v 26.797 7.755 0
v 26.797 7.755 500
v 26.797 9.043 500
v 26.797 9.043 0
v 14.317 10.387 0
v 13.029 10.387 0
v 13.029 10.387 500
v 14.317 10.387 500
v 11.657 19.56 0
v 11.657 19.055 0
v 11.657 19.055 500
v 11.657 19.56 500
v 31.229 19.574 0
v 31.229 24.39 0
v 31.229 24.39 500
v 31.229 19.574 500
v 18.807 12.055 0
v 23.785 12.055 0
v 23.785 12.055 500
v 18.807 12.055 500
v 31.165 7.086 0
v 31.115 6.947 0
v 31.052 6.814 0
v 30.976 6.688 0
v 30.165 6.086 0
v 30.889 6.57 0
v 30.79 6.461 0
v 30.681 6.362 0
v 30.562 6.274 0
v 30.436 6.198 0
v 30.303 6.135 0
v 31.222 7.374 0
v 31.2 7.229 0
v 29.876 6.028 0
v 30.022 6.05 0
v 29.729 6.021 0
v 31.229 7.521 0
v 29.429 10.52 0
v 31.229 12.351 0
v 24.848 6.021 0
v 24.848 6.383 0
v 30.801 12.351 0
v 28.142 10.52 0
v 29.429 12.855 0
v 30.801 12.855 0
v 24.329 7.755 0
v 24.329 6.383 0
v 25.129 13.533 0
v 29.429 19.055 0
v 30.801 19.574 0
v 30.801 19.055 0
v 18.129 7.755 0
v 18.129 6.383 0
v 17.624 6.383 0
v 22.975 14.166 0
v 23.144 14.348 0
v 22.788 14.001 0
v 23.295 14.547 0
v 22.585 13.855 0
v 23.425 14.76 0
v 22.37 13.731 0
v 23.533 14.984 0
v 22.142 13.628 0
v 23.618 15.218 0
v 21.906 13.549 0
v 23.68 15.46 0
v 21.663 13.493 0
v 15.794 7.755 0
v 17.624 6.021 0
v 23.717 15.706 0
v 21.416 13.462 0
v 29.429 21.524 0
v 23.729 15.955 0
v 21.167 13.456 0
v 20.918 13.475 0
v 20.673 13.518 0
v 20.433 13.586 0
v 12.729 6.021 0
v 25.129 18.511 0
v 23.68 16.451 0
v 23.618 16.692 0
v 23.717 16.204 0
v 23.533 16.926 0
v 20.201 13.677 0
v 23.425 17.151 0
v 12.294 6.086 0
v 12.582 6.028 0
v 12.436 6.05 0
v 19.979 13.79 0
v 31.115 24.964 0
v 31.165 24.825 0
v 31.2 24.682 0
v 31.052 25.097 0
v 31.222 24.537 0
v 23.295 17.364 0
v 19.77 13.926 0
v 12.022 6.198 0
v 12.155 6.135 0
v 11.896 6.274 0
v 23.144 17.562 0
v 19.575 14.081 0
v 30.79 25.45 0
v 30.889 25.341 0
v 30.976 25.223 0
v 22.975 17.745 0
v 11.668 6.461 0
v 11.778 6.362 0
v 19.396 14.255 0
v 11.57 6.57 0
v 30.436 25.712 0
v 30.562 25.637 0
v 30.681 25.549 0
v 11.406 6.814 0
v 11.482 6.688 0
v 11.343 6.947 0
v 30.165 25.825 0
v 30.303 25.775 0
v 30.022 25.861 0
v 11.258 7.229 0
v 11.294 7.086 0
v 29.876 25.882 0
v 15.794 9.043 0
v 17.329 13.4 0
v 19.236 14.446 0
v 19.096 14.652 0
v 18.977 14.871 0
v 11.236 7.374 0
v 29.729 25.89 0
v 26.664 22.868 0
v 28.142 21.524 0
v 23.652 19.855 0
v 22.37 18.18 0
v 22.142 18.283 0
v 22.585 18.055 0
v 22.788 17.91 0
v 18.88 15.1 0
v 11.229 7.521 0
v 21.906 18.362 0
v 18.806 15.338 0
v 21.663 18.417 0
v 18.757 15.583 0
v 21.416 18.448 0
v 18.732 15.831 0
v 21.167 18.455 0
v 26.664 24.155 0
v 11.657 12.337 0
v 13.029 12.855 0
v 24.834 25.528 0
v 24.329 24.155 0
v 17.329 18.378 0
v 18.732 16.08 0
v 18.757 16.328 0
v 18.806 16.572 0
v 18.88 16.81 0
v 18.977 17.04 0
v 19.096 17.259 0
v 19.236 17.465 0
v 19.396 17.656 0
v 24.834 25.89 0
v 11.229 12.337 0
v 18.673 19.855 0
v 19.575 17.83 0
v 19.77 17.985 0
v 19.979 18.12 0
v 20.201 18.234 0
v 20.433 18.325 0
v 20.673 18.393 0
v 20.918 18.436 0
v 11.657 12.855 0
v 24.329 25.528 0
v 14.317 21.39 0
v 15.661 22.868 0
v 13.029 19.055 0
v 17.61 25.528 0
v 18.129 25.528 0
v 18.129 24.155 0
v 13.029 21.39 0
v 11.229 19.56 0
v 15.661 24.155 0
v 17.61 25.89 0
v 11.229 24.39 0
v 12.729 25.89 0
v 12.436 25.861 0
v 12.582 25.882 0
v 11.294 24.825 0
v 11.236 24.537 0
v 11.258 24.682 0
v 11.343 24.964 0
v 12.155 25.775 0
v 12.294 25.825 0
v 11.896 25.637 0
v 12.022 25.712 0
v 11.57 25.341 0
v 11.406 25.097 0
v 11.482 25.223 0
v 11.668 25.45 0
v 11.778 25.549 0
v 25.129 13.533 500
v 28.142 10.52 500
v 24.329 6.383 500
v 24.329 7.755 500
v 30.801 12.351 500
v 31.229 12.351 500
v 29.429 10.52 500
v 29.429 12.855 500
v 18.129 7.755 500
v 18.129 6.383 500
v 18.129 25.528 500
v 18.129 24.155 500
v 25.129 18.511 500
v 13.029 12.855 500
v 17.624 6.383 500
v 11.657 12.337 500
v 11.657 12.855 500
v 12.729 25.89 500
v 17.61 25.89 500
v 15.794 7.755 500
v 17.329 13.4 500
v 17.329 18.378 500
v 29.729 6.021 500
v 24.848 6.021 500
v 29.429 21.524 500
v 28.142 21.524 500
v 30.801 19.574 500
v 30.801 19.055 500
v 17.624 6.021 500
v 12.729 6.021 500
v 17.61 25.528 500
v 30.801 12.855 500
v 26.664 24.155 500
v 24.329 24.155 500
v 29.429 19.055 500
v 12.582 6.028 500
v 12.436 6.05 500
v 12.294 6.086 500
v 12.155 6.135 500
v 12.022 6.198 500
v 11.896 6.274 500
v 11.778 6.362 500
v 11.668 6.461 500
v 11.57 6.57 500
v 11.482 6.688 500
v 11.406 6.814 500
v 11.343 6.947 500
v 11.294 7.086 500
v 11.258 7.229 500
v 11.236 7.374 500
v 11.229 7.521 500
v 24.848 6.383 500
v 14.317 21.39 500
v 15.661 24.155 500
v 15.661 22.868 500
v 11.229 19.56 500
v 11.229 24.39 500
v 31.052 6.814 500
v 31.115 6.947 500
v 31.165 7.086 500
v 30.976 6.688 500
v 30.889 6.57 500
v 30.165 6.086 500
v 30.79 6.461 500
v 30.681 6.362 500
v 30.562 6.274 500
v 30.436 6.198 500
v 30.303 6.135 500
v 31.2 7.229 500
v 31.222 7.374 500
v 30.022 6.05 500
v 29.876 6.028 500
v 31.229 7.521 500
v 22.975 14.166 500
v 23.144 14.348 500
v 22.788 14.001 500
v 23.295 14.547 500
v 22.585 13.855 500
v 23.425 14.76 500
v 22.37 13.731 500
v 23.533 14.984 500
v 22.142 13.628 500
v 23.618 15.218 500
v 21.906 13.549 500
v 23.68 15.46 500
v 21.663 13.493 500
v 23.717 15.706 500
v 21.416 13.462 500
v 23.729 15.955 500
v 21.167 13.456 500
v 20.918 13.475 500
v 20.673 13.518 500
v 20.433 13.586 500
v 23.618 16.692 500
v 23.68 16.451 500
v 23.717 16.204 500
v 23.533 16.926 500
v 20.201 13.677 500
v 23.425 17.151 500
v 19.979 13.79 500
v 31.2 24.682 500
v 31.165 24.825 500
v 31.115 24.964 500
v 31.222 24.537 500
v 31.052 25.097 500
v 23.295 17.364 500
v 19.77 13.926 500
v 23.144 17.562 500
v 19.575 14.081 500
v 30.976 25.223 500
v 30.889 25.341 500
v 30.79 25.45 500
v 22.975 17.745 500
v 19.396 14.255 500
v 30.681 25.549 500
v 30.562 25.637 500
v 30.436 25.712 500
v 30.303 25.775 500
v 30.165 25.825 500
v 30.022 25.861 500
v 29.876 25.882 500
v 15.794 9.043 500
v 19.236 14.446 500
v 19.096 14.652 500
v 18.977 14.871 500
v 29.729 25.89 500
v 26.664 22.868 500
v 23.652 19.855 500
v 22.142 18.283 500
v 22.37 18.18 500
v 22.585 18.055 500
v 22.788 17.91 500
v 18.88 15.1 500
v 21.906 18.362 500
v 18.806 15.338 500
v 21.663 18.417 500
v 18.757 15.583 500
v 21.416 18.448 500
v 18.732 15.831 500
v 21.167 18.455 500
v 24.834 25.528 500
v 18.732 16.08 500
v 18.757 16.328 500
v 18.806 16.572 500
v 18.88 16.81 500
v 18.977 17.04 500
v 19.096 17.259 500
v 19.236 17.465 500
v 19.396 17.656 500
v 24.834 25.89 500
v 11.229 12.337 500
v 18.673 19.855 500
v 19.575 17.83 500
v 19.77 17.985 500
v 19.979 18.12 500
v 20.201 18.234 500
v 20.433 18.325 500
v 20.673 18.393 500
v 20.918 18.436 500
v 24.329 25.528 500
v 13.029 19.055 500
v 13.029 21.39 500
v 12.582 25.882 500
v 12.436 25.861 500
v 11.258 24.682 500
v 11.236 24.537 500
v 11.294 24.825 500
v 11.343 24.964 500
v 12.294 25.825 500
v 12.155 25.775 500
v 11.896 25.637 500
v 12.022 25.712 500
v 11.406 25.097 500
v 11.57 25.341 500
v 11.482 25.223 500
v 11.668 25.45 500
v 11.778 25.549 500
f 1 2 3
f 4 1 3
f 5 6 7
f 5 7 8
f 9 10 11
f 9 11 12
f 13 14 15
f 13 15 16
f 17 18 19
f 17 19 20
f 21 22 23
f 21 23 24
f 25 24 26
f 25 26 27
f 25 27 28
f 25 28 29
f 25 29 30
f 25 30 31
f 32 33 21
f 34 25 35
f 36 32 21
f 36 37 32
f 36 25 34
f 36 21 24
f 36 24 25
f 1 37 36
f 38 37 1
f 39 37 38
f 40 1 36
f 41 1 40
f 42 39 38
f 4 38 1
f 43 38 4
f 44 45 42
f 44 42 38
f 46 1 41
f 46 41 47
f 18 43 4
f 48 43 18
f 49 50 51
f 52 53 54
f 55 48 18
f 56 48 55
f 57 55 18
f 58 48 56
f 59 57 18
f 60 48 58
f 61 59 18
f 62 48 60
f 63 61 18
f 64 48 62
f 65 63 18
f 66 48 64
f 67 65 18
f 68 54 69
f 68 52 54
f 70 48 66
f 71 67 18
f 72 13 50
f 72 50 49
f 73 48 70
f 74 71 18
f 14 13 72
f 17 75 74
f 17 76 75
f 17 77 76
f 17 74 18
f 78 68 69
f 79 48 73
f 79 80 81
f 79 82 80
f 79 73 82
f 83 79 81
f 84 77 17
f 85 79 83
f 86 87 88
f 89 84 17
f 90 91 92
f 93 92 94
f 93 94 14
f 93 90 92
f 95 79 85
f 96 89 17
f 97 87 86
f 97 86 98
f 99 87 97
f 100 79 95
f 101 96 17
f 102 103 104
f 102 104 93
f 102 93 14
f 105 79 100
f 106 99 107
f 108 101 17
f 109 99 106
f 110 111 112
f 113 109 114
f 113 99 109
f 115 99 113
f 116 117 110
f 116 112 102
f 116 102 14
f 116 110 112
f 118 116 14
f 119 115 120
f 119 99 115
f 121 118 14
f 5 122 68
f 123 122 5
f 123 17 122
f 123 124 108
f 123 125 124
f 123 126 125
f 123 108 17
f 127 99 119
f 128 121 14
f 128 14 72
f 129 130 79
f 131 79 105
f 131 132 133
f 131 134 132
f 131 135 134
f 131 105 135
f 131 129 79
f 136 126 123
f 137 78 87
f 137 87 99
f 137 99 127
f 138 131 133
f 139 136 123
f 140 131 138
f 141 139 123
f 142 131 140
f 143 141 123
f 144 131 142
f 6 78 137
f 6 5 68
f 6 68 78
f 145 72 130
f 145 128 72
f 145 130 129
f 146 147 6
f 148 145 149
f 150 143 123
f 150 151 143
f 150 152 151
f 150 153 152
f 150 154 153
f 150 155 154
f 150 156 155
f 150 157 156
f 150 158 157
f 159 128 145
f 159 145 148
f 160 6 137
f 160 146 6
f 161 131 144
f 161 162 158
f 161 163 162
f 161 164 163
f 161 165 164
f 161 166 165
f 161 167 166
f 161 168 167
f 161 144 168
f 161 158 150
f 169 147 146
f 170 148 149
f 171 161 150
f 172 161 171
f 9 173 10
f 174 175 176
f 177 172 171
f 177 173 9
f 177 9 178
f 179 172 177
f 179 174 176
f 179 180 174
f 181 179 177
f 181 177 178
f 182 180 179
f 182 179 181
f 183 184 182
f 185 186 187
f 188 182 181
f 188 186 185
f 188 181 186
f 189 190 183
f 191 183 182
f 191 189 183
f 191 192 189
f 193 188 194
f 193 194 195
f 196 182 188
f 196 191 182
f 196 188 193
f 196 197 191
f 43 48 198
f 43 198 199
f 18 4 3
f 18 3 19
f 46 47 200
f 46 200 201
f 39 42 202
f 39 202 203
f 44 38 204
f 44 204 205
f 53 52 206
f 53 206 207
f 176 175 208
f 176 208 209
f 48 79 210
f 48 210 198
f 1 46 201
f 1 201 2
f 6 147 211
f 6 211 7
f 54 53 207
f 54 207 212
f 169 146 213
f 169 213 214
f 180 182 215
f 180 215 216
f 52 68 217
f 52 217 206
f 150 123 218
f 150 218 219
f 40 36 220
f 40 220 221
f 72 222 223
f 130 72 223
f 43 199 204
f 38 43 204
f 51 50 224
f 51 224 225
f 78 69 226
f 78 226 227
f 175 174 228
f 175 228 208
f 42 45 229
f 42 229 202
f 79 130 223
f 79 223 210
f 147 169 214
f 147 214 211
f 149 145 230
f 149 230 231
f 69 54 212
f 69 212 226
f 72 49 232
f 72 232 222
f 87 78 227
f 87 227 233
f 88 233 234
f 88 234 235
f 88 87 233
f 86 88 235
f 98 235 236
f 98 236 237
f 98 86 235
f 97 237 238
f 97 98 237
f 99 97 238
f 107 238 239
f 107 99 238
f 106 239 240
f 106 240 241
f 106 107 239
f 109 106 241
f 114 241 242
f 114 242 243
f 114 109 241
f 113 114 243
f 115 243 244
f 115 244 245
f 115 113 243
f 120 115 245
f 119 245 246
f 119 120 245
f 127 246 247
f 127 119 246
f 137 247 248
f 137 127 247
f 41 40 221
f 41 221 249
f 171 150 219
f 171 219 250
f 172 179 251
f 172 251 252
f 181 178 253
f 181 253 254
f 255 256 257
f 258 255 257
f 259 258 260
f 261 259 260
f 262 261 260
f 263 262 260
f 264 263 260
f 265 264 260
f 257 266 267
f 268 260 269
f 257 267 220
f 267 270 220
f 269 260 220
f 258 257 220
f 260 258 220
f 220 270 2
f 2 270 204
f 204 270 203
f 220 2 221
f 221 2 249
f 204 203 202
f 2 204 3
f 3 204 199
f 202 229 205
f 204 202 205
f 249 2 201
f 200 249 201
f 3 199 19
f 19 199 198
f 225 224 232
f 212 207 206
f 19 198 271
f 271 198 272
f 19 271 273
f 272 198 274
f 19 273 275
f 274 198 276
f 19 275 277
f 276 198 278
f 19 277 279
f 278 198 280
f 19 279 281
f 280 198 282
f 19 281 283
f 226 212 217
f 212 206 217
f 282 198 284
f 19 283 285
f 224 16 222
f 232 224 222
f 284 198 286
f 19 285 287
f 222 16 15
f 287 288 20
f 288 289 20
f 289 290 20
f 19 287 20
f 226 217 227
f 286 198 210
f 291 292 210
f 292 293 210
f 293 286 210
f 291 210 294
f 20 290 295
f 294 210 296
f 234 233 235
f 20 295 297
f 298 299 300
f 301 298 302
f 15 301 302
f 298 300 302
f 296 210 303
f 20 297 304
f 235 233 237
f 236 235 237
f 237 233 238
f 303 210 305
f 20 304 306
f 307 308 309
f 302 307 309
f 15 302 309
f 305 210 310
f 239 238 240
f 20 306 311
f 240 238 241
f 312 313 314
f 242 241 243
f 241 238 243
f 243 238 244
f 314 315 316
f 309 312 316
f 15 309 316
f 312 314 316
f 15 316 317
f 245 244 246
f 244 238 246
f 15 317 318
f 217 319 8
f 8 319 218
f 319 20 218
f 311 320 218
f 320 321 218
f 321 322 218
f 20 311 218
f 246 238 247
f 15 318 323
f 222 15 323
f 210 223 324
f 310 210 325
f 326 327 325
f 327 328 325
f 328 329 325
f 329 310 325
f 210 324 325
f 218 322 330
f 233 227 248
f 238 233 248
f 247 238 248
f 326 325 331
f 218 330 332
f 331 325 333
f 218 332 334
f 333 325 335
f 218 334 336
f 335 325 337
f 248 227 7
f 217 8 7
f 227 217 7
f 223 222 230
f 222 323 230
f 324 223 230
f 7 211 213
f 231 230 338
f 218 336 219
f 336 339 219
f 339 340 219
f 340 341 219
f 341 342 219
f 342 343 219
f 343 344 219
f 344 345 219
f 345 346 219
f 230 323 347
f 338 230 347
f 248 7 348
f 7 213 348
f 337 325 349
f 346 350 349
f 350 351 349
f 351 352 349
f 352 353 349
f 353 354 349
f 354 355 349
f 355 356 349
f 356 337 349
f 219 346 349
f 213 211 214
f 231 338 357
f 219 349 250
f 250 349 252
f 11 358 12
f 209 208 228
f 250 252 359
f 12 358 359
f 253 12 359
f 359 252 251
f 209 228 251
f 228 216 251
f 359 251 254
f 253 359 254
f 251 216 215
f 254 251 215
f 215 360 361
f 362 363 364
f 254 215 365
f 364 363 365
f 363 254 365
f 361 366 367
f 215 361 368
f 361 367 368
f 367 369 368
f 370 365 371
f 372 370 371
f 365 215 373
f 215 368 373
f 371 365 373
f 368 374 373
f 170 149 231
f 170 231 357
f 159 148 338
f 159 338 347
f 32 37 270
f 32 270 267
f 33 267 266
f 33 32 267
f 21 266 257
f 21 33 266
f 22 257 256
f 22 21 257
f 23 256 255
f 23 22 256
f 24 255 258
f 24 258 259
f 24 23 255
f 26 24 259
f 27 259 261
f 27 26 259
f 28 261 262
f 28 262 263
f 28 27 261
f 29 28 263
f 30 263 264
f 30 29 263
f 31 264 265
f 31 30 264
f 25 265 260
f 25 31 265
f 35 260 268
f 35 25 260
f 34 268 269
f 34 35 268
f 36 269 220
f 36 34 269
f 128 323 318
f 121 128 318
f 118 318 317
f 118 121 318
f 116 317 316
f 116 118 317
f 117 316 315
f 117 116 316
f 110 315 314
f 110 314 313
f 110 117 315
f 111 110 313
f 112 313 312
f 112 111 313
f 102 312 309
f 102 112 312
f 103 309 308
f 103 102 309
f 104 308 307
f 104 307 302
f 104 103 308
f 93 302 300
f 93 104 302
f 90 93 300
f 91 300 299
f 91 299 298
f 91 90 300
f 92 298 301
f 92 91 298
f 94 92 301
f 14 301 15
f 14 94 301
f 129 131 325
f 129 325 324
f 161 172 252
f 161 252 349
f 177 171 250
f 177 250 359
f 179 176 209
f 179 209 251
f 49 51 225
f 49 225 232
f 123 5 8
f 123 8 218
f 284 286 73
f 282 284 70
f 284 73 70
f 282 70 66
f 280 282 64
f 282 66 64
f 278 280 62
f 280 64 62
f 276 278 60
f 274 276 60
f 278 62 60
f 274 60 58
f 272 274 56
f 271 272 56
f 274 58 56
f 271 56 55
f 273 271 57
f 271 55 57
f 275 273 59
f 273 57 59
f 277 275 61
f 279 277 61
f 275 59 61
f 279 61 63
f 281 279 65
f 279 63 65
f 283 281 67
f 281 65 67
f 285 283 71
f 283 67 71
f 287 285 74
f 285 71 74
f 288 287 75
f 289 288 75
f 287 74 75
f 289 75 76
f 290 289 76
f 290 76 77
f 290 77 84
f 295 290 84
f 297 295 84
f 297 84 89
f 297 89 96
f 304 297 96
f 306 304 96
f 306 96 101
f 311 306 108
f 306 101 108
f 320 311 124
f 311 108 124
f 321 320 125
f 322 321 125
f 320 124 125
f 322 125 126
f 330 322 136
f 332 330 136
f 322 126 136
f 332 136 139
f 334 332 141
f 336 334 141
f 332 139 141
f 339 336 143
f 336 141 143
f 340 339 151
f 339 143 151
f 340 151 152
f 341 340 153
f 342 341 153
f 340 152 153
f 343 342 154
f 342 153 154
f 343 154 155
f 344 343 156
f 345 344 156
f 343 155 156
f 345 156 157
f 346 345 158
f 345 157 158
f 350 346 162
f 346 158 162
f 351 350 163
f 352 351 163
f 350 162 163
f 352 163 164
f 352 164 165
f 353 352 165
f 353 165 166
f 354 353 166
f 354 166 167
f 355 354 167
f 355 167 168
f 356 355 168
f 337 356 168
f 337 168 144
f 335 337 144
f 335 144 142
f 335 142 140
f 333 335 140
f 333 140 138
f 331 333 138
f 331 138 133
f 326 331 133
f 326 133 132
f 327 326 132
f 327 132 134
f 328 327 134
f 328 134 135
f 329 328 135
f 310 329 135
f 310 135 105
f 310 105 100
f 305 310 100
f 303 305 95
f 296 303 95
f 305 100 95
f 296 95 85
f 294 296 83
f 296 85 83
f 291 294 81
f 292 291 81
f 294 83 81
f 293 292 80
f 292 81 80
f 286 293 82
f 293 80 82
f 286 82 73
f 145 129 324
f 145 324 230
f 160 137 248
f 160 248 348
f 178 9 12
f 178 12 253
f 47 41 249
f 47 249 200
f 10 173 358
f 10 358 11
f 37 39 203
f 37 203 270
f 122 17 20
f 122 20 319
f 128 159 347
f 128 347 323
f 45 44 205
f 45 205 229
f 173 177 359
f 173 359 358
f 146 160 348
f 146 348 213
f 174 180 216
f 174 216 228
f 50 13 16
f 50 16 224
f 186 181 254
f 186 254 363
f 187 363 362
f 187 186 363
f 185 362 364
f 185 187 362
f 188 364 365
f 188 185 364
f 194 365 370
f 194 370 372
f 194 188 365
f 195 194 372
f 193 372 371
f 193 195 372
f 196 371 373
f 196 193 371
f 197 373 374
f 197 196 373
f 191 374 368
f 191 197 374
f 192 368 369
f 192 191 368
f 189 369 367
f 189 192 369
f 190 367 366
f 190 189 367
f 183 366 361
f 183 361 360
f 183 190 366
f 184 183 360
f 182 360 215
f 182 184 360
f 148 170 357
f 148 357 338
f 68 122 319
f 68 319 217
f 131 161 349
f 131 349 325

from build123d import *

# Parameters (mm, degrees)
SKETCH1_R           = 2.5
BOSS_EXTRUDE1_DEPTH = 500


with BuildPart() as part:
    # Sketch1 → Boss-Extrude1 (new body)
    with BuildSketch(Plane(origin=(0, 0, 0), x_dir=(-1, 0, 0), z_dir=(0, 0, -1))):
        with BuildLine():
            Line((-31.229112559, 24.389540696), (-31.229112559, 19.574084592))
            Line((-31.229112559, 19.574084592), (-30.801486653, 19.574084592))
            Line((-30.801486653, 19.574084592), (-30.801486653, 19.055371932))
            Line((-30.801486653, 19.055371932), (-29.429112559, 19.055371932))
            Line((-29.429112559, 19.055371932), (-29.429112559, 21.523527696))
            Line((-29.429112559, 21.523527696), (-28.141605593, 21.523527696))
            Line((-28.141605593, 21.523527696), (-25.129112559, 18.511034662))
            Line((-25.129112559, 18.511034662), (-25.129112559, 13.532983276))
            Line((-25.129112559, 13.532983276), (-28.141605593, 10.520490242))
            Line((-28.141605593, 10.520490242), (-29.429112559, 10.520490242))
            Line((-29.429112559, 10.520490242), (-29.429112559, 12.855371932))
            Line((-29.429112559, 12.855371932), (-30.801486653, 12.855371932))
            Line((-30.801486653, 12.855371932), (-30.801486653, 12.350696072))
            Line((-30.801486653, 12.350696072), (-31.229112559, 12.350696072))
            Line((-31.229112559, 12.350696072), (-31.229112559, 7.521203168))
            ThreePointArc((-31.229112559, 7.521203168), (-30.789772731, 6.460542996), (-29.729112559, 6.021203168))
            Line((-29.729112559, 6.021203168), (-24.847825219, 6.021203168))
            Line((-24.847825219, 6.021203168), (-24.847825219, 6.382997838))
            Line((-24.847825219, 6.382997838), (-24.329112559, 6.382997838))
            Line((-24.329112559, 6.382997838), (-24.329112559, 7.755371932))
            Line((-24.329112559, 7.755371932), (-26.797268323, 7.755371932))
            Line((-26.797268323, 7.755371932), (-26.797268323, 9.042878898))
            Line((-26.797268323, 9.042878898), (-23.784775289, 12.055371932))
            Line((-23.784775289, 12.055371932), (-18.806723903, 12.055371932))
            Line((-18.806723903, 12.055371932), (-15.794230869, 9.042878898))
            Line((-15.794230869, 9.042878898), (-15.794230869, 7.755371932))
            Line((-15.794230869, 7.755371932), (-18.129112559, 7.755371932))
            Line((-18.129112559, 7.755371932), (-18.129112559, 6.382997838))
            Line((-18.129112559, 6.382997838), (-17.624436699, 6.382997838))
            Line((-17.624436699, 6.382997838), (-17.624436699, 6.021203168))
            Line((-17.624436699, 6.021203168), (-12.729112559, 6.021203168))
            ThreePointArc((-12.729112559, 6.021203168), (-11.668452387, 6.460542996), (-11.229112559, 7.521203168))
            Line((-11.229112559, 7.521203168), (-11.229112559, 12.336659272))
            Line((-11.229112559, 12.336659272), (-11.656738465, 12.336659272))
            Line((-11.656738465, 12.336659272), (-11.656738465, 12.855371932))
            Line((-11.656738465, 12.855371932), (-13.029112559, 12.855371932))
            Line((-13.029112559, 12.855371932), (-13.029112559, 10.387216168))
            Line((-13.029112559, 10.387216168), (-14.316619525, 10.387216168))
            Line((-14.316619525, 10.387216168), (-17.329112559, 13.399709202))
            Line((-17.329112559, 13.399709202), (-17.329112559, 18.377760588))
            Line((-17.329112559, 18.377760588), (-14.316619525, 21.390253622))
            Line((-14.316619525, 21.390253622), (-13.029112559, 21.390253622))
            Line((-13.029112559, 21.390253622), (-13.029112559, 19.055371932))
            Line((-13.029112559, 19.055371932), (-11.656738465, 19.055371932))
            Line((-11.656738465, 19.055371932), (-11.656738465, 19.560047792))
            Line((-11.656738465, 19.560047792), (-11.229112559, 19.560047792))
            Line((-11.229112559, 19.560047792), (-11.229112559, 24.389540696))
            ThreePointArc((-11.229112559, 24.389540696), (-11.668452387, 25.450200868), (-12.729112559, 25.889540696))
            Line((-12.729112559, 25.889540696), (-17.610399899, 25.889540696))
            Line((-17.610399899, 25.889540696), (-17.610399899, 25.527746026))
            Line((-17.610399899, 25.527746026), (-18.129112559, 25.527746026))
            Line((-18.129112559, 25.527746026), (-18.129112559, 24.155371932))
            Line((-18.129112559, 24.155371932), (-15.660956795, 24.155371932))
            Line((-15.660956795, 24.155371932), (-15.660956795, 22.867864966))
            Line((-15.660956795, 22.867864966), (-18.673449829, 19.855371932))
            Line((-18.673449829, 19.855371932), (-23.651501215, 19.855371932))
            Line((-23.651501215, 19.855371932), (-26.663994249, 22.867864966))
            Line((-26.663994249, 22.867864966), (-26.663994249, 24.155371932))
            Line((-26.663994249, 24.155371932), (-24.329112559, 24.155371932))
            Line((-24.329112559, 24.155371932), (-24.329112559, 25.527746026))
            Line((-24.329112559, 25.527746026), (-24.833788419, 25.527746026))
            Line((-24.833788419, 25.527746026), (-24.833788419, 25.889540696))
            Line((-24.833788419, 25.889540696), (-29.729112559, 25.889540696))
            ThreePointArc((-29.729112559, 25.889540696), (-30.789772731, 25.450200868), (-31.229112559, 24.389540696))
        make_face()
        with Locations(Location((-21.229112559, 15.955371932, 0), (0, 0, 180))):
            Circle(SKETCH1_R, mode=Mode.SUBTRACT)
    extrude(amount=-BOSS_EXTRUDE1_DEPTH)


solid = part.part
